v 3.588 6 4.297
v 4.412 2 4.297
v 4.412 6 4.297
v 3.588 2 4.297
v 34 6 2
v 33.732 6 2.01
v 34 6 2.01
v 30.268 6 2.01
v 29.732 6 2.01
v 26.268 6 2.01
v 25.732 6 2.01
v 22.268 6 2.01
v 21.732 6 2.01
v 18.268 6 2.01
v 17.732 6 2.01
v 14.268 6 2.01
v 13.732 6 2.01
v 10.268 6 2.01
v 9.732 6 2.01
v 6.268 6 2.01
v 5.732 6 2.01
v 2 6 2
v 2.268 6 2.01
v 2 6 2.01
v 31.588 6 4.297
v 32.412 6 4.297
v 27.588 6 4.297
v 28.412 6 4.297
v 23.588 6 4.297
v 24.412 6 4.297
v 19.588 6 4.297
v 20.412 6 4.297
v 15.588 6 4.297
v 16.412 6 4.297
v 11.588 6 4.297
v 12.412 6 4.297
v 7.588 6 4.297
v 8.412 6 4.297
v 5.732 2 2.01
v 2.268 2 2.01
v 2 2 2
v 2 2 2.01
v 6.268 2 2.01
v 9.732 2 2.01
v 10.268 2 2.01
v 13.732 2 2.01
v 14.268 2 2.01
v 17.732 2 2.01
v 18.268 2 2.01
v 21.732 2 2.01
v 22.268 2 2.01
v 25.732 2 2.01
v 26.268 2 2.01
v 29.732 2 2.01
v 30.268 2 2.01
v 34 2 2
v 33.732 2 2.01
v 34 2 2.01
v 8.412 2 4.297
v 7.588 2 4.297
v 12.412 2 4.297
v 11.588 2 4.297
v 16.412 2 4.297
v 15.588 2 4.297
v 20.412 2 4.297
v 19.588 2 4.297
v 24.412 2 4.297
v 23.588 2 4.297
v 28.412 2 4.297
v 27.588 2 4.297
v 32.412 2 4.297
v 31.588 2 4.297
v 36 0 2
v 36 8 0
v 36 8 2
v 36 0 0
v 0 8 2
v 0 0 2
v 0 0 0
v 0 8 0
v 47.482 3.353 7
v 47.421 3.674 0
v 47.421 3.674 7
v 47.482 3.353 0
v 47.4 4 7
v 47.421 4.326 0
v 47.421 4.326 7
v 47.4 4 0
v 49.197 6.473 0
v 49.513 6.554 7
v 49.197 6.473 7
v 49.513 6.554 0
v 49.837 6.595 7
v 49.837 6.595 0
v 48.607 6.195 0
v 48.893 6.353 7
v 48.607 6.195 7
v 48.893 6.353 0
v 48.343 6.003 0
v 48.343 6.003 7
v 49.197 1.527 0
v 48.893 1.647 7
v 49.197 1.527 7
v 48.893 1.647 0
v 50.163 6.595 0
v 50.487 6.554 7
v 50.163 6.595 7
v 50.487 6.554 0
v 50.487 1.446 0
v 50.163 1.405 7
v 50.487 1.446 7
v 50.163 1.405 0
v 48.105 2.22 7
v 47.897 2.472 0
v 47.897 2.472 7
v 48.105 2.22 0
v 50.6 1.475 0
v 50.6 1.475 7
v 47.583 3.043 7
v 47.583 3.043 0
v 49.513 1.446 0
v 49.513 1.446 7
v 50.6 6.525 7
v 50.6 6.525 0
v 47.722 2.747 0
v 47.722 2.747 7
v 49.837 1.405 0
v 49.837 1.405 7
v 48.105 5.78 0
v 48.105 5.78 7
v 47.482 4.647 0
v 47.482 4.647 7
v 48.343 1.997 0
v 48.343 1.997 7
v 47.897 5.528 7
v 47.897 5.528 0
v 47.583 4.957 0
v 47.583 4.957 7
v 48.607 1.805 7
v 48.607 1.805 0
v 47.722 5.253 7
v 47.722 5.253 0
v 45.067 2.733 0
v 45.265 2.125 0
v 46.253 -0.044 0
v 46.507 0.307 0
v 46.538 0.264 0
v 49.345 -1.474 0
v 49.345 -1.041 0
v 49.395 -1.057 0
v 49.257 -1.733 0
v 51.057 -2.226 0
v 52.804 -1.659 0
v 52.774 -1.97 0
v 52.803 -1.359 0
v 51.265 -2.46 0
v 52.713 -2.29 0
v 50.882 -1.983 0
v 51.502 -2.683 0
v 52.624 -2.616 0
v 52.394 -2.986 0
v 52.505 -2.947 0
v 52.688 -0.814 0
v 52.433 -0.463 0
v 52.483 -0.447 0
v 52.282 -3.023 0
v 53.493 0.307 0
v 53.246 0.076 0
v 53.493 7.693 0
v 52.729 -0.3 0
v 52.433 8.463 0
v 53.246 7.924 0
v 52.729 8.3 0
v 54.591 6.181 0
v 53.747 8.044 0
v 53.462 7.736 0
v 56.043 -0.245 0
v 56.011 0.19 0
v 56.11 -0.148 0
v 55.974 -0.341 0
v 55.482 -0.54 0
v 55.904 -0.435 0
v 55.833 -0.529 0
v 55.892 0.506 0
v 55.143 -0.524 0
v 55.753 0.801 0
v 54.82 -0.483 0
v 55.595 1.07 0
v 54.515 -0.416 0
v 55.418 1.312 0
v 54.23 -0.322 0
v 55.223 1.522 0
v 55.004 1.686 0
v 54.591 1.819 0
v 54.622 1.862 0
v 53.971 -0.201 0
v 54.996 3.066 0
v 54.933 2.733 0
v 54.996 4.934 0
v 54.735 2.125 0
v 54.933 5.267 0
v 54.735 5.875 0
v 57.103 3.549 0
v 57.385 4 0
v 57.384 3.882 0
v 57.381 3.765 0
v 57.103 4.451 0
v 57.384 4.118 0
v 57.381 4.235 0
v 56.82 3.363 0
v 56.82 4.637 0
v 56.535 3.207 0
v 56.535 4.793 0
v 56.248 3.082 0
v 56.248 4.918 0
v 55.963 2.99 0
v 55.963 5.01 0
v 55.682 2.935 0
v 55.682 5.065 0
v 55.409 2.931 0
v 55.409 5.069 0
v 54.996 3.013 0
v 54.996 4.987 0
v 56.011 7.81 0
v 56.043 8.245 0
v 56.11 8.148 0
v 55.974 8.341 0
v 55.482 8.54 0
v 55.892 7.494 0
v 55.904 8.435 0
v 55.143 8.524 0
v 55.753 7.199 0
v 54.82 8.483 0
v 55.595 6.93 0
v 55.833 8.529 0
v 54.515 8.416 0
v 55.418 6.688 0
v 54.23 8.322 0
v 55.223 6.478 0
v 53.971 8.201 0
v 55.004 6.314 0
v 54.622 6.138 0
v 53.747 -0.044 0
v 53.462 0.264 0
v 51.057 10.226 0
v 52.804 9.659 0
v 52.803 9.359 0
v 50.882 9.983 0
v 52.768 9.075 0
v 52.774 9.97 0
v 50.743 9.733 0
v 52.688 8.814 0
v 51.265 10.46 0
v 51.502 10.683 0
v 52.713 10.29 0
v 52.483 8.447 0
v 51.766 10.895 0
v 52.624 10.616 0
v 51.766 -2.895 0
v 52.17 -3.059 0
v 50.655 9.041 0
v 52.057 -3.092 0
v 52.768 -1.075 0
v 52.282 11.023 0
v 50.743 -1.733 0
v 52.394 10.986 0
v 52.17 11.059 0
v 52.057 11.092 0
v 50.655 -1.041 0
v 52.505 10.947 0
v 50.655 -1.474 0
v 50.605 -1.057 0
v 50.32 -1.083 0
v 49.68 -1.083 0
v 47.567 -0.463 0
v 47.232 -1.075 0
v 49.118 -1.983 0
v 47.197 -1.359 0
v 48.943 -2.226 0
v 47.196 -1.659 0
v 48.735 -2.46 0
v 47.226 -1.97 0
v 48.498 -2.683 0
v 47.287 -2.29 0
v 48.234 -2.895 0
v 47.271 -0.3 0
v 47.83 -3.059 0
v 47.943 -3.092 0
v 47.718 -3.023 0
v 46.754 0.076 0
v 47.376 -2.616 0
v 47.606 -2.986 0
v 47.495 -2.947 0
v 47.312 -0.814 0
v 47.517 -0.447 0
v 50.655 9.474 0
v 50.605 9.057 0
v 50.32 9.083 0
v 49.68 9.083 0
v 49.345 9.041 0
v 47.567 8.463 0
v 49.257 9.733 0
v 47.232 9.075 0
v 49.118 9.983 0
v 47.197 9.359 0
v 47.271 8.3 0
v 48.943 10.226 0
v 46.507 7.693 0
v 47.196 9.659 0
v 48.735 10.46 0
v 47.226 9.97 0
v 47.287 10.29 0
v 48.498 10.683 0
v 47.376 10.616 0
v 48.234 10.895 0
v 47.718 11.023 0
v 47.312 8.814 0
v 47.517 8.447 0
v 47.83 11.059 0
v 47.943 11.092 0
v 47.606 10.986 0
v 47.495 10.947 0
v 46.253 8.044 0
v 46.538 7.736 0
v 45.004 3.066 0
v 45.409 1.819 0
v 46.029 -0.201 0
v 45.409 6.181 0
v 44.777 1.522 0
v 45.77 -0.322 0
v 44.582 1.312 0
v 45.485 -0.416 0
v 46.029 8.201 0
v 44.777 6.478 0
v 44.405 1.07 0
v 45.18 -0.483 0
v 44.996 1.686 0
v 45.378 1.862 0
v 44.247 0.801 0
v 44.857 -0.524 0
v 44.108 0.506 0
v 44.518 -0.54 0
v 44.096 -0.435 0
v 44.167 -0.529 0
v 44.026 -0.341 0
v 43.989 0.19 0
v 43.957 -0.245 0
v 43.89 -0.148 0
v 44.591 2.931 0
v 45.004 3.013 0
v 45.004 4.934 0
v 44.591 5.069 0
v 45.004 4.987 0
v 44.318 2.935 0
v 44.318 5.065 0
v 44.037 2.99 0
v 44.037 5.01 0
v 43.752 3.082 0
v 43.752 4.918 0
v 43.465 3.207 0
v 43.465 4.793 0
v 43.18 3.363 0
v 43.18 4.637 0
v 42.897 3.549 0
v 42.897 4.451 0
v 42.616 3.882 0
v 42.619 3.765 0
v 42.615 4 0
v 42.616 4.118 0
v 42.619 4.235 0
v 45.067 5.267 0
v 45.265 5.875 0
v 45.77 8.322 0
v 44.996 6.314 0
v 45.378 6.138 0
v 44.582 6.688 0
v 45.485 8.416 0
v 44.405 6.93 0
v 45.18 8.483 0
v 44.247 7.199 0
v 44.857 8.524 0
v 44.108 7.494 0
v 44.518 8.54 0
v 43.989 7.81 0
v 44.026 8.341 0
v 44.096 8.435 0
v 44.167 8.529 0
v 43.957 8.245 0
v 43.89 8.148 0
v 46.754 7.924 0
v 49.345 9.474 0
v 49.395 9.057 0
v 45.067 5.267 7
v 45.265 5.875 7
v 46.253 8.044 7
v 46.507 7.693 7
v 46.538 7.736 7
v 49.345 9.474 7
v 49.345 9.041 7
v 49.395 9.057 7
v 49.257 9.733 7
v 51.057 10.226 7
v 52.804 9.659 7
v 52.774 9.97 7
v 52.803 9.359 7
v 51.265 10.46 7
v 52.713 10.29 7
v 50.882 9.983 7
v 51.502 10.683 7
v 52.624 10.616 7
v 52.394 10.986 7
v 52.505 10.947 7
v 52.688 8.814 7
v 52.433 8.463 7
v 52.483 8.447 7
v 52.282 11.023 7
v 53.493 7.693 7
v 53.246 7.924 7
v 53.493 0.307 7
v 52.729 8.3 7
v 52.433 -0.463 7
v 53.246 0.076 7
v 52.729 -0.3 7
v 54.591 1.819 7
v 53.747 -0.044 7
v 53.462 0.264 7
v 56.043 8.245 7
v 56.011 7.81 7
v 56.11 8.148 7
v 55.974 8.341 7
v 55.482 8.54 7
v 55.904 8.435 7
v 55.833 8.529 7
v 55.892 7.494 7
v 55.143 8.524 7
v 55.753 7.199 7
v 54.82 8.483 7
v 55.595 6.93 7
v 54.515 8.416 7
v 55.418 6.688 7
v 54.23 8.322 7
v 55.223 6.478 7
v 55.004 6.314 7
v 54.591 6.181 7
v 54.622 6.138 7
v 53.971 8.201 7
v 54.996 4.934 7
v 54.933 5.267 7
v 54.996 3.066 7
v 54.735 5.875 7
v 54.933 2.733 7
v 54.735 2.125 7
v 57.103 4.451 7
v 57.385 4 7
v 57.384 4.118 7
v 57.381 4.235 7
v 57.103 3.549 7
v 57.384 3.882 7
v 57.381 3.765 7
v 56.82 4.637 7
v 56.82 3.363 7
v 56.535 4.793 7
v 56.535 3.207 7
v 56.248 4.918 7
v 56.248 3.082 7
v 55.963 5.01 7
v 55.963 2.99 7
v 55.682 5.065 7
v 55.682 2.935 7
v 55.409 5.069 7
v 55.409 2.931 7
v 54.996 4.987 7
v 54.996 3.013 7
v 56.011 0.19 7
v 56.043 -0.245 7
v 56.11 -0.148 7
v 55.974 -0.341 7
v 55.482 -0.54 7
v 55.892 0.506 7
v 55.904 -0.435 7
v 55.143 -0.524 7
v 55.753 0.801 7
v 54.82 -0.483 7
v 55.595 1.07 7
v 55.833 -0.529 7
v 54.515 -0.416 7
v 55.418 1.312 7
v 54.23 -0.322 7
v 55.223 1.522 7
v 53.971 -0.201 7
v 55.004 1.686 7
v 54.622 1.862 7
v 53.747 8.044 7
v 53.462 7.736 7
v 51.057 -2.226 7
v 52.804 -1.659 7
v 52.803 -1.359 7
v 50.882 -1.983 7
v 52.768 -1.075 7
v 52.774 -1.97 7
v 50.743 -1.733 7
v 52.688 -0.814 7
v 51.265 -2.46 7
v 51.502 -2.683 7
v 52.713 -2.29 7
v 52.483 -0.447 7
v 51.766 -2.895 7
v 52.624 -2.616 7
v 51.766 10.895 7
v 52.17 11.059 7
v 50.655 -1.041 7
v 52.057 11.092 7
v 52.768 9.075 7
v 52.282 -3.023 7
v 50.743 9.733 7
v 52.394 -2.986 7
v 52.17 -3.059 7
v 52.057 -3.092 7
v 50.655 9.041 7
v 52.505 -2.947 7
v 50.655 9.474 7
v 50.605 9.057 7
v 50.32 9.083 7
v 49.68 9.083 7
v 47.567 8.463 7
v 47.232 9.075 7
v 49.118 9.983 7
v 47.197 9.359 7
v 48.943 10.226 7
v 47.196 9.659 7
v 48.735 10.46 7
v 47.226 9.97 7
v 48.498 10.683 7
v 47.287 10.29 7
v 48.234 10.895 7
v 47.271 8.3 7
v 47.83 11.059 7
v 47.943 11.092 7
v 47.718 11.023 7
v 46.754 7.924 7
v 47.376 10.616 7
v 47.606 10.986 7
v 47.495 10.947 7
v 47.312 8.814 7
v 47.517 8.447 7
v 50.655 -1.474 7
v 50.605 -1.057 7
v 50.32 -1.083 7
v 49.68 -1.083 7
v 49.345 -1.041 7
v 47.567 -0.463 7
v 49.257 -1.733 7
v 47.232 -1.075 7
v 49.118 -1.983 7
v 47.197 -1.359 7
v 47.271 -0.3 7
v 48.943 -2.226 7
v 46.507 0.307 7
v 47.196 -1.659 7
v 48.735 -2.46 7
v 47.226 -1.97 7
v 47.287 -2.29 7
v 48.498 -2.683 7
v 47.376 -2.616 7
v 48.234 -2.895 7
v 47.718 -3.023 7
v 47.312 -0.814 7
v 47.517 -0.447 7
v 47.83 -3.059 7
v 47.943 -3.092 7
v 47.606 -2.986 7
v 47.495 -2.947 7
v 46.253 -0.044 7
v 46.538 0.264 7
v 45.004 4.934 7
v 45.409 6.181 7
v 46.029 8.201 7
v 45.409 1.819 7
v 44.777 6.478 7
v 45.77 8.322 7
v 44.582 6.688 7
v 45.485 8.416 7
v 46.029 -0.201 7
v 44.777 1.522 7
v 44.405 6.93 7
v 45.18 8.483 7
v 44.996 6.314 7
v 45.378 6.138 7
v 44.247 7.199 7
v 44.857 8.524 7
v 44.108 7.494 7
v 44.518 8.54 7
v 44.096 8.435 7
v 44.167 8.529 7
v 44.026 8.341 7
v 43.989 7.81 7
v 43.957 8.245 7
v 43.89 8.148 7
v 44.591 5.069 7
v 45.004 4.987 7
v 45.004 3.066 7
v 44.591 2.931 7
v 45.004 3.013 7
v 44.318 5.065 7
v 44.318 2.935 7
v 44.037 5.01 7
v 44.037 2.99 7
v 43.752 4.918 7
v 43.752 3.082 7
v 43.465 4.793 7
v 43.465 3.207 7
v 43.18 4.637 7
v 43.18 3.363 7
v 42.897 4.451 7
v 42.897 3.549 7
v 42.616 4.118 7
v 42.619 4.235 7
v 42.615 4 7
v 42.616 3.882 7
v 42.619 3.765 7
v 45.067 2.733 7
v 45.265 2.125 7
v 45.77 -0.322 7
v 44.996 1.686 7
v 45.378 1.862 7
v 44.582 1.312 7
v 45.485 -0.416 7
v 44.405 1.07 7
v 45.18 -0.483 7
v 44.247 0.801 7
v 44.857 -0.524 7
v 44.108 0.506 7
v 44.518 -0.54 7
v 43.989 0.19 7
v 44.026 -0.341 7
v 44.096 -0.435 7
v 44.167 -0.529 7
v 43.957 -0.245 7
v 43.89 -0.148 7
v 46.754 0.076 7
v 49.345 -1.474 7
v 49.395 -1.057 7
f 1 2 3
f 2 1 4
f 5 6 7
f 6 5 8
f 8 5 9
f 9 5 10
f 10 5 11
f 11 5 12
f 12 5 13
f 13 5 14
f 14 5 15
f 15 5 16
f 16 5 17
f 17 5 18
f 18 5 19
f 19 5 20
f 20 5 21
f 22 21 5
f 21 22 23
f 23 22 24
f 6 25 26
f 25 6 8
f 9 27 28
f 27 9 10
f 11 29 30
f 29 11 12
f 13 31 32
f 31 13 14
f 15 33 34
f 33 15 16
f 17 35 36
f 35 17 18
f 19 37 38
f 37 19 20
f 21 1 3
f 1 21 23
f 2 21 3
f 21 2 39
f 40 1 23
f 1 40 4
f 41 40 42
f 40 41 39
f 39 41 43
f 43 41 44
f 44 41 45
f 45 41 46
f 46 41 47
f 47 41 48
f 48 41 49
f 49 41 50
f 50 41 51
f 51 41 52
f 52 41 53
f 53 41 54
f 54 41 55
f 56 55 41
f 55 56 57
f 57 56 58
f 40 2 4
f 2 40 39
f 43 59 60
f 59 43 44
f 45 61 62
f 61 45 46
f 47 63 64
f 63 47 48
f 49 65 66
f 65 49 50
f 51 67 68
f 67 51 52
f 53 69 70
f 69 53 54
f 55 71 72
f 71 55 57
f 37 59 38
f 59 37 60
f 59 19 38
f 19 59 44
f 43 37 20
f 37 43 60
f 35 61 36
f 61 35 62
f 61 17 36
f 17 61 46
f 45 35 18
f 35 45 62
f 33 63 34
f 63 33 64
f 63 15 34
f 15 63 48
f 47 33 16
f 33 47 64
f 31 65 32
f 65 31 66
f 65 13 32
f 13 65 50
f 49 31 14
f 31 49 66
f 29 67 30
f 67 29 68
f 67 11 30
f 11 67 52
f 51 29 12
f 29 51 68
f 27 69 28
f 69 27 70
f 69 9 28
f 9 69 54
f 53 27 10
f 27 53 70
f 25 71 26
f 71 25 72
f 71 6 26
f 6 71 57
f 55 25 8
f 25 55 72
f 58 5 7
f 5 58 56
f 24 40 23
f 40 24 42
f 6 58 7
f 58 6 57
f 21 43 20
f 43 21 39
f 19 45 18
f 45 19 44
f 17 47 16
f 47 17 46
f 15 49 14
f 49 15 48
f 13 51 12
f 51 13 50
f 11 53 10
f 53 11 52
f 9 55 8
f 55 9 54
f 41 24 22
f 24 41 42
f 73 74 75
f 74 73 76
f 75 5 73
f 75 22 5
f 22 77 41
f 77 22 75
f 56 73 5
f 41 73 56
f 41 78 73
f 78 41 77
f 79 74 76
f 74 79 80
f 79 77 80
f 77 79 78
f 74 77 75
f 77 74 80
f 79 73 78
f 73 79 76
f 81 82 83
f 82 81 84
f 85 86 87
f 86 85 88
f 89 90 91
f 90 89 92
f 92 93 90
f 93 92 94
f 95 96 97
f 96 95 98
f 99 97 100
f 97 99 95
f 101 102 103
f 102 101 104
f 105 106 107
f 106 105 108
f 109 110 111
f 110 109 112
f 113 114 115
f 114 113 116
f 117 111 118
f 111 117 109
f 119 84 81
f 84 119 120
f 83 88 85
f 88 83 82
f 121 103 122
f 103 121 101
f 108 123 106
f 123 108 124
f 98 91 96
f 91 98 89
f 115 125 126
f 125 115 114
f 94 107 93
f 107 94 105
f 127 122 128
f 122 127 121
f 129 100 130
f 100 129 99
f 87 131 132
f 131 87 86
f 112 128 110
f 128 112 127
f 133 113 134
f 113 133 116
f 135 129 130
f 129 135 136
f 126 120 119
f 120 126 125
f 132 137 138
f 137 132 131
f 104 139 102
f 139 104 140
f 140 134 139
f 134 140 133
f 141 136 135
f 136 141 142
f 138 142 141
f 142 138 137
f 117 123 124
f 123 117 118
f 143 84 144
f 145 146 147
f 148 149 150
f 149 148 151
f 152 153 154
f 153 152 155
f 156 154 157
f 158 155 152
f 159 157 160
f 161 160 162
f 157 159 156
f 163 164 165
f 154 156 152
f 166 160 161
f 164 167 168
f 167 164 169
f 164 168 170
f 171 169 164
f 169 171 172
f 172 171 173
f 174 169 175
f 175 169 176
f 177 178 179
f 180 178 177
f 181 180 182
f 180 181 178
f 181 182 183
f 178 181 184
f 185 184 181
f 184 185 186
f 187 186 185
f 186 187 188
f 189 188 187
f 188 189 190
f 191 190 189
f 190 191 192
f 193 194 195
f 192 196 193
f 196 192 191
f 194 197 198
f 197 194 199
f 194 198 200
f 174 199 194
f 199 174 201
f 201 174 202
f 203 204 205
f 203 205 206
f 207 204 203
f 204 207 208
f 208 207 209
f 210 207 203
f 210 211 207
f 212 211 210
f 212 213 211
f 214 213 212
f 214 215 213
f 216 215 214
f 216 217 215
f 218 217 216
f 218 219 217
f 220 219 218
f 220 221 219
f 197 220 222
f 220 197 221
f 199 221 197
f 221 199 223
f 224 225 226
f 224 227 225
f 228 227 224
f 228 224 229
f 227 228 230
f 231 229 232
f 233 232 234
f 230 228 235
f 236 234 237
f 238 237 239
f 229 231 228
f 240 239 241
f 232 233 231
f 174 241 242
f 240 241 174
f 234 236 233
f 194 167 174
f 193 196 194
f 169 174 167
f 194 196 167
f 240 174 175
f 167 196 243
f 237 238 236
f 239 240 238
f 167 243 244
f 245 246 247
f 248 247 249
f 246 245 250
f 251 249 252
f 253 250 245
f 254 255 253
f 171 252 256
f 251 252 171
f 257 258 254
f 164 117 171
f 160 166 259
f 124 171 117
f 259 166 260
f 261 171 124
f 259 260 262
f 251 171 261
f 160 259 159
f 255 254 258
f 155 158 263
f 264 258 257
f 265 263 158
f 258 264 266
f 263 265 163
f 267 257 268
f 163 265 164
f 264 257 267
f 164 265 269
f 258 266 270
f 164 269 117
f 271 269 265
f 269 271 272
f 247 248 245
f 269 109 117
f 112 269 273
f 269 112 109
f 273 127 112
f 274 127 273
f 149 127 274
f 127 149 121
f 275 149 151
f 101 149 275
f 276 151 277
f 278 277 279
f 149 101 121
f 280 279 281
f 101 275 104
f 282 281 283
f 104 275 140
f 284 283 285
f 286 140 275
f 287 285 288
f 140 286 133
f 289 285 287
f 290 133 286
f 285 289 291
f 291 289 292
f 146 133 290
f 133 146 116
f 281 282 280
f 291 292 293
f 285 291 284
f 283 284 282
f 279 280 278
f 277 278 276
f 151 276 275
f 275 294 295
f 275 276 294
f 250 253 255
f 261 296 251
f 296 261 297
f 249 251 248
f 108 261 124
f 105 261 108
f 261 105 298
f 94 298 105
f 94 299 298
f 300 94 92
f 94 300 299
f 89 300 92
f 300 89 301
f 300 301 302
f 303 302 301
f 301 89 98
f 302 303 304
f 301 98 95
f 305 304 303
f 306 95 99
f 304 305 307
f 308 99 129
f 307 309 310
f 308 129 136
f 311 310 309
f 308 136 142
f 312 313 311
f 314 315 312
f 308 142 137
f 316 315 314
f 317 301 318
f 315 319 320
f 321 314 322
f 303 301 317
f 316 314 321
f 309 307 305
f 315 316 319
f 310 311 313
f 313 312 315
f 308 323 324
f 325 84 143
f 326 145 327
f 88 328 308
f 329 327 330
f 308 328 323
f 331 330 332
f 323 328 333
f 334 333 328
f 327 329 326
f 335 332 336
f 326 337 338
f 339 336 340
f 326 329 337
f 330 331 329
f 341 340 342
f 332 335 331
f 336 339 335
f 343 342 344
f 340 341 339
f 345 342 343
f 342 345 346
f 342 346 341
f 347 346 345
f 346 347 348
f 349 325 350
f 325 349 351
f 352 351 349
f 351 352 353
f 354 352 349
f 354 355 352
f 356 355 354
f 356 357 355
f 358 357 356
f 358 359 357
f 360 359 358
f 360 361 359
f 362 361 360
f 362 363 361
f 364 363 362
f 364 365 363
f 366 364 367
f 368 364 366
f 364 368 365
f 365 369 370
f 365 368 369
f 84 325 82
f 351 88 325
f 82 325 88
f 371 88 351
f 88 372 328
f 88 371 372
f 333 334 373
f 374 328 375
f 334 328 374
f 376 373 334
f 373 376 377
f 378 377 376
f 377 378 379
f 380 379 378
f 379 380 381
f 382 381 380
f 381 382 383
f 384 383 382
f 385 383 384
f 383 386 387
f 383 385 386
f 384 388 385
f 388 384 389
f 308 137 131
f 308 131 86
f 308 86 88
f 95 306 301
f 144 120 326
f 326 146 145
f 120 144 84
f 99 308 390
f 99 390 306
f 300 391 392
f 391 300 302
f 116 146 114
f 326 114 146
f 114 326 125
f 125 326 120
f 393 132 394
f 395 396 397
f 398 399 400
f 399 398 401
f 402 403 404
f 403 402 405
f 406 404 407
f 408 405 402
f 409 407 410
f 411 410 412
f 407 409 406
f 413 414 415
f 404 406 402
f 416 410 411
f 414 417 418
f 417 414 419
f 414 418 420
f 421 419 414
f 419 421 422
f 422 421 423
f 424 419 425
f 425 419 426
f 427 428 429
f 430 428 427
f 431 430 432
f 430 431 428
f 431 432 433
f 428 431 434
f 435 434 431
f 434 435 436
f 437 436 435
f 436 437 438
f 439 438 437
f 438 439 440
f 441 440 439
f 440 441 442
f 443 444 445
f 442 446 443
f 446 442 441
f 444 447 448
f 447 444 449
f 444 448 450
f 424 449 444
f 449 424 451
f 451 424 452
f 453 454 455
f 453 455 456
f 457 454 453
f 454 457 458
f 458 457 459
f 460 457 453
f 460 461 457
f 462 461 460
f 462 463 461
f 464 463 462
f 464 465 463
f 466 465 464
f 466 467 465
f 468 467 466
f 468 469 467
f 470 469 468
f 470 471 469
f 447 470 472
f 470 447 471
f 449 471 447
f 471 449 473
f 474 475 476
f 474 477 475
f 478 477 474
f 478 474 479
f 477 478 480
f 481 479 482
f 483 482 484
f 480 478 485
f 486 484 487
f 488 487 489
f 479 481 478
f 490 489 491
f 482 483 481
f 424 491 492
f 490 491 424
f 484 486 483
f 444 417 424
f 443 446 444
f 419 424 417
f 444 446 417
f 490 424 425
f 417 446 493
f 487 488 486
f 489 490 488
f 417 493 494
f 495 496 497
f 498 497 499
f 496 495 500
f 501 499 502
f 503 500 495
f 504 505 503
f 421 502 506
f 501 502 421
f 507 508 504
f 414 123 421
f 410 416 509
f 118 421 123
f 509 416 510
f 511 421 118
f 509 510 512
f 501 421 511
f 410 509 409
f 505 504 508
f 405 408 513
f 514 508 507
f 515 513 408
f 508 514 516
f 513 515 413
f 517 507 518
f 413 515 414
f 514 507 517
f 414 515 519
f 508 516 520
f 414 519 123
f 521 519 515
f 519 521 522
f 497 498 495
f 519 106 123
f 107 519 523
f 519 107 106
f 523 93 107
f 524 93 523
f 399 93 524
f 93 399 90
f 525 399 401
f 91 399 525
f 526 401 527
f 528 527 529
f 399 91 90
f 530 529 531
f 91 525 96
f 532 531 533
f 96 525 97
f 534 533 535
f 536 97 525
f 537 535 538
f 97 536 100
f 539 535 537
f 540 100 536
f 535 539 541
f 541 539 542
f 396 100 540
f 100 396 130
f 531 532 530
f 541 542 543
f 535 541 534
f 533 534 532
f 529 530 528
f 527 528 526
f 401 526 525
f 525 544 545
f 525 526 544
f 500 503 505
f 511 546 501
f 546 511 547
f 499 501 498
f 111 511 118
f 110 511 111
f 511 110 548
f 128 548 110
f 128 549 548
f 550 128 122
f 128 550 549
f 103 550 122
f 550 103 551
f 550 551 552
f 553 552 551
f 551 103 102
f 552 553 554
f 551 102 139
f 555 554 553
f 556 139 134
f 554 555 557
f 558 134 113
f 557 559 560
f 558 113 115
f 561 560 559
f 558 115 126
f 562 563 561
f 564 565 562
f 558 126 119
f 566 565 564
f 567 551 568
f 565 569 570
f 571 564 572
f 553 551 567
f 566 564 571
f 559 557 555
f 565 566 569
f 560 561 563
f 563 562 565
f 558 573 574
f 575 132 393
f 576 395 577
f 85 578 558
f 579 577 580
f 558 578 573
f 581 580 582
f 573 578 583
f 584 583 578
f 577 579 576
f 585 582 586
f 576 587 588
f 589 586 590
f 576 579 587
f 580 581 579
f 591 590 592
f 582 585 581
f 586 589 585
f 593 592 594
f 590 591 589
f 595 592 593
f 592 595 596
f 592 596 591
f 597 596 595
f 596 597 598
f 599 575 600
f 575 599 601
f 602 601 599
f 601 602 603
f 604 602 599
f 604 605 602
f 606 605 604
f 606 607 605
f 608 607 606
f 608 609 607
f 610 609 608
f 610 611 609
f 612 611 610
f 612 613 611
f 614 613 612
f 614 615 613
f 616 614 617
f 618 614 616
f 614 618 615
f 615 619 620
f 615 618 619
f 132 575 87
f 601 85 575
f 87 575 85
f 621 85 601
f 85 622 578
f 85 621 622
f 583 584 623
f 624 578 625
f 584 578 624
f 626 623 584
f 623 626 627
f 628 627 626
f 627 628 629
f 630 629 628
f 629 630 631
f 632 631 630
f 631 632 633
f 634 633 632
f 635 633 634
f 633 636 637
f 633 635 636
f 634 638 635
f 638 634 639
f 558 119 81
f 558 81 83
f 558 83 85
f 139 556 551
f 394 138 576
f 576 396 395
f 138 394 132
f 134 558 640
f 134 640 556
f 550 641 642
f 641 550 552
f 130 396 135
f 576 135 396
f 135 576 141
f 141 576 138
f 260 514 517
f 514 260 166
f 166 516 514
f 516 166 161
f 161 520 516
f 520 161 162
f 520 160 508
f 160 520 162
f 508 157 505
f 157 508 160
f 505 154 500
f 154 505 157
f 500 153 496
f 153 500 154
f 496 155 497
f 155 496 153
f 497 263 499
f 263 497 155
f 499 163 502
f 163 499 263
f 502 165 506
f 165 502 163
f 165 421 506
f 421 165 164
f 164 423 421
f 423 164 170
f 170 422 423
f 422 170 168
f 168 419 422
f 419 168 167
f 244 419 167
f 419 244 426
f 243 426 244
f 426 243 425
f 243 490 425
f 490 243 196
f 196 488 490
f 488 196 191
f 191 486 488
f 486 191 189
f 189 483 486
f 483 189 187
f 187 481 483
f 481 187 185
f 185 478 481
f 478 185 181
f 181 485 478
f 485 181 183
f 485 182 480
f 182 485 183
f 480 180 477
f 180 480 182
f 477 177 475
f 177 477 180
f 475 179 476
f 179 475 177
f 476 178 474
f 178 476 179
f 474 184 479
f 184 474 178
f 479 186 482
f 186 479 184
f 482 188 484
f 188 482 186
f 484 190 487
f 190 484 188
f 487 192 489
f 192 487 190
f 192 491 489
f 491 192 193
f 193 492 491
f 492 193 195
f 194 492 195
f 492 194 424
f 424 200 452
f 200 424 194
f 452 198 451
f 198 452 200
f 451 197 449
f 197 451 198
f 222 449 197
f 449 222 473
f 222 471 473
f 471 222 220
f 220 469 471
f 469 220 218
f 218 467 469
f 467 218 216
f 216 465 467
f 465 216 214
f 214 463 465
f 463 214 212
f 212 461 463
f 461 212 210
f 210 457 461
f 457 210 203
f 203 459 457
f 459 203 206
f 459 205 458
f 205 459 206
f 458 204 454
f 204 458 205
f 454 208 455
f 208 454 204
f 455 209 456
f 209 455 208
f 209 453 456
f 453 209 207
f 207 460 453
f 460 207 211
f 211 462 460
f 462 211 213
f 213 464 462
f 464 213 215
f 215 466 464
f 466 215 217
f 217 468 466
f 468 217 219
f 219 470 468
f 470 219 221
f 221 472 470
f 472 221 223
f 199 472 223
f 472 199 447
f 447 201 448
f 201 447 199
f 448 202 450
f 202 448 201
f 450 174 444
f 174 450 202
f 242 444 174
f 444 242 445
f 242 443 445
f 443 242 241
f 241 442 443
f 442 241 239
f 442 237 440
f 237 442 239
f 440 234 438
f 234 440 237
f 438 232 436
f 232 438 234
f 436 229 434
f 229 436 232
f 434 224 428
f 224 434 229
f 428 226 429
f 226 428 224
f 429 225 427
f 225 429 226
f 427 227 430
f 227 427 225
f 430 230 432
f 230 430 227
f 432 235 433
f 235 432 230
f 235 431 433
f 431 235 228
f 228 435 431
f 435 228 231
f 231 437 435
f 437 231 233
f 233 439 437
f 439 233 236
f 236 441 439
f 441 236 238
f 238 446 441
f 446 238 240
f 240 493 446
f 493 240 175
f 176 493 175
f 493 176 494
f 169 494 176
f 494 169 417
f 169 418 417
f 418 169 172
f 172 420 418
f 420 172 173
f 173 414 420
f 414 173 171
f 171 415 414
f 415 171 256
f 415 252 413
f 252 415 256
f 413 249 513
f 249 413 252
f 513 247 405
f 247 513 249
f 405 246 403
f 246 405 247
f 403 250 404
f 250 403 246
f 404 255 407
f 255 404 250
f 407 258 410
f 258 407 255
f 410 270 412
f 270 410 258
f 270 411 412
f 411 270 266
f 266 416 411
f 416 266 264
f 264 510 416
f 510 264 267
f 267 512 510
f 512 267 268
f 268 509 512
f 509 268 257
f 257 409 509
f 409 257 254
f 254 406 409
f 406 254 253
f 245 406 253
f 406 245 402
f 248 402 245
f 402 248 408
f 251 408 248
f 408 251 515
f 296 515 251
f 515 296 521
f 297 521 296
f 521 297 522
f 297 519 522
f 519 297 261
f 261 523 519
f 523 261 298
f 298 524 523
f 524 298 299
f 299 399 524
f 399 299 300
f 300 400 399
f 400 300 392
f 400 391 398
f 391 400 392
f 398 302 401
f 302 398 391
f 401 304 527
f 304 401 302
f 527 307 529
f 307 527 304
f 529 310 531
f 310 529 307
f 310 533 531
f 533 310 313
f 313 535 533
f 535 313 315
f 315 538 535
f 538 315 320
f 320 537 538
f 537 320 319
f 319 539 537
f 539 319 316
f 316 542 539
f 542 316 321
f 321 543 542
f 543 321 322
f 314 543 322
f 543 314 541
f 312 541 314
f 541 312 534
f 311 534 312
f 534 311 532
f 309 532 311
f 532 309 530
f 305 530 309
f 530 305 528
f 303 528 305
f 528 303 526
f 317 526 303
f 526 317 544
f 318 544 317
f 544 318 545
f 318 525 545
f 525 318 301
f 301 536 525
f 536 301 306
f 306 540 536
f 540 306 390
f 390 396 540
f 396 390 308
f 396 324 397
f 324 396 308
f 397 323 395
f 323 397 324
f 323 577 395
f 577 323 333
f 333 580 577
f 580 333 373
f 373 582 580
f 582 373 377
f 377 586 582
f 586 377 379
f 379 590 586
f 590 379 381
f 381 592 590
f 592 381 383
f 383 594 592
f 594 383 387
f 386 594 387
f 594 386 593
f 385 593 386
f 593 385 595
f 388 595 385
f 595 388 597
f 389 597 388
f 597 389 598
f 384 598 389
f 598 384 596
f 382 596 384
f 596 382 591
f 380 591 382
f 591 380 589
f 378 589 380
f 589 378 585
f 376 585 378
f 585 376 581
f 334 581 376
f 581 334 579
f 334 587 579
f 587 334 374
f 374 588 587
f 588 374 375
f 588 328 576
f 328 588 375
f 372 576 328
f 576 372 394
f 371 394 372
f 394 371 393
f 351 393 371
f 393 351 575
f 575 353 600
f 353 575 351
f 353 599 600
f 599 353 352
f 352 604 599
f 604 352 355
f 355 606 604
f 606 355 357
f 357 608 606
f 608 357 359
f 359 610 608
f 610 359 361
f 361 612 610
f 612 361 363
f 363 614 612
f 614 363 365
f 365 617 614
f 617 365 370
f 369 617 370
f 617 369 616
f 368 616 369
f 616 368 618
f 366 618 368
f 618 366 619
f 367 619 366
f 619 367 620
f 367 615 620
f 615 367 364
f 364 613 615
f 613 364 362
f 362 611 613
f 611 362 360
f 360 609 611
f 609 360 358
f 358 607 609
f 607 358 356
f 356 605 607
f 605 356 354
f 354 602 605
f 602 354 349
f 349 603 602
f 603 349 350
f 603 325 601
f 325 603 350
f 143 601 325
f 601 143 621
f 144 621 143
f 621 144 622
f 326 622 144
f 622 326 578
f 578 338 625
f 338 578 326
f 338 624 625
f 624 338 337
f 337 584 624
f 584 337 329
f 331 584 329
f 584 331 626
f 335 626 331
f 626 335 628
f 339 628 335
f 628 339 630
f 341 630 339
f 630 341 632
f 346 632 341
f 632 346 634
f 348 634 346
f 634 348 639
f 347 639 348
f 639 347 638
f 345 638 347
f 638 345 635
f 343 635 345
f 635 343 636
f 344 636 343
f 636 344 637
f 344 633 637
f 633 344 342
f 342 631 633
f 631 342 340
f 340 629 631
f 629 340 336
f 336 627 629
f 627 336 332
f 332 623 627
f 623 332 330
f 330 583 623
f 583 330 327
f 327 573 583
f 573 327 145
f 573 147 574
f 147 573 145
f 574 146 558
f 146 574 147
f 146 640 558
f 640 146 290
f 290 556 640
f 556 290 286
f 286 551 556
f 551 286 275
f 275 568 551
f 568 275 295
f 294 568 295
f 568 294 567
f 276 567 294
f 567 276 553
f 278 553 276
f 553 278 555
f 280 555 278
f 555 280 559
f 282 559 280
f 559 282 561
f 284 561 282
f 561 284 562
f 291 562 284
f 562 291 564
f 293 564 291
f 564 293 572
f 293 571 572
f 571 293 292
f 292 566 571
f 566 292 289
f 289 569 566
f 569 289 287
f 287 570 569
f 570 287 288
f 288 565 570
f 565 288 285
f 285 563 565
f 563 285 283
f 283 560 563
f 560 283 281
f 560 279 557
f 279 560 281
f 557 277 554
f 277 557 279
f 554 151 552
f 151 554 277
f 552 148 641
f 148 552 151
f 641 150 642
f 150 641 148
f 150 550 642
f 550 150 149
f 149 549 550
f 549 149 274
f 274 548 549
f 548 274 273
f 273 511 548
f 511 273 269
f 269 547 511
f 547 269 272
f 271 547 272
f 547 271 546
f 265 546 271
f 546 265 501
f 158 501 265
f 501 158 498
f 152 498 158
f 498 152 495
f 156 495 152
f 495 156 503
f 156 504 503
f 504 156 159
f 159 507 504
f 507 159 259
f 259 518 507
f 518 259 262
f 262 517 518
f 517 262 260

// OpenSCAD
/*
  Cupom fisico barato para validar a cremalheira/pinhao antes das pecas longas.
  Imprime dois componentes: rack curto e um pinhao real com furo D.
*/

include <00_Parametros.scad>;

coupon_length=36.0;
coupon_w=8.0;
coupon_base_h=2.0;

module rack_coupon() {
  union() {
    cube([coupon_length,coupon_w,coupon_base_h]);
    translate([2,coupon_w/2,coupon_base_h])
      rack_x(coupon_length-4);
  }
}

rack_coupon();
translate([50,coupon_w/2,0]) pinion_gear();
